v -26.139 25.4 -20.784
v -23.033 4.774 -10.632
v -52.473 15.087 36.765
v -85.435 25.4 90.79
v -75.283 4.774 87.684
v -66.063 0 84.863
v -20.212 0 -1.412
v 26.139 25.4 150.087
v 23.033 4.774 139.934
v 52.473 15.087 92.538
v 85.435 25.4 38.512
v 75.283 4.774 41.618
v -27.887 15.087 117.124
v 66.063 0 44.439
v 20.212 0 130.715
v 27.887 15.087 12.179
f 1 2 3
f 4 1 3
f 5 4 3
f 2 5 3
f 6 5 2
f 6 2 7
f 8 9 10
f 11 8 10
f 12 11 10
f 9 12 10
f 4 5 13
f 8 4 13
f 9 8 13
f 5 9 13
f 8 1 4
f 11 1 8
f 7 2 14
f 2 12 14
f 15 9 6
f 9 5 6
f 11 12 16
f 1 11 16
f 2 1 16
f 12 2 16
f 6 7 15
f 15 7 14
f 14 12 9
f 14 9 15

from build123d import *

# Parameters (mm, degrees)
F1_DEPTH = 25.4
F1_TAPER = -20
F2_SIZE  = 5.08


# Not quite as in the source:
# - a feature names something its author has since deleted; it is built from what else it names


with BuildPart() as f1:
    # F0 (on Front) → F1 (new body)
    with BuildSketch(Plane.XZ):
        Polygon((-22.3139226437, -8.2820653915), (72.9333236814, 42.3373356462), (22.3139226437, 137.5845819712), (-72.9333236814, 86.9651809335), align=None)
    extrude(amount=-F1_DEPTH, taper=F1_TAPER)

    # F2
    f2_edges = [f1.edges().sort_by_distance(p)[0] for p in [
        (25.309701, 0, 17.027635),
        (47.623623, 0, 89.960959),
        (-25.309701, 0, 112.274881),
        (-47.623623, 0, 39.341558),
    ]]
    chamfer(f2_edges, length=F2_SIZE)


solid = f1.part
